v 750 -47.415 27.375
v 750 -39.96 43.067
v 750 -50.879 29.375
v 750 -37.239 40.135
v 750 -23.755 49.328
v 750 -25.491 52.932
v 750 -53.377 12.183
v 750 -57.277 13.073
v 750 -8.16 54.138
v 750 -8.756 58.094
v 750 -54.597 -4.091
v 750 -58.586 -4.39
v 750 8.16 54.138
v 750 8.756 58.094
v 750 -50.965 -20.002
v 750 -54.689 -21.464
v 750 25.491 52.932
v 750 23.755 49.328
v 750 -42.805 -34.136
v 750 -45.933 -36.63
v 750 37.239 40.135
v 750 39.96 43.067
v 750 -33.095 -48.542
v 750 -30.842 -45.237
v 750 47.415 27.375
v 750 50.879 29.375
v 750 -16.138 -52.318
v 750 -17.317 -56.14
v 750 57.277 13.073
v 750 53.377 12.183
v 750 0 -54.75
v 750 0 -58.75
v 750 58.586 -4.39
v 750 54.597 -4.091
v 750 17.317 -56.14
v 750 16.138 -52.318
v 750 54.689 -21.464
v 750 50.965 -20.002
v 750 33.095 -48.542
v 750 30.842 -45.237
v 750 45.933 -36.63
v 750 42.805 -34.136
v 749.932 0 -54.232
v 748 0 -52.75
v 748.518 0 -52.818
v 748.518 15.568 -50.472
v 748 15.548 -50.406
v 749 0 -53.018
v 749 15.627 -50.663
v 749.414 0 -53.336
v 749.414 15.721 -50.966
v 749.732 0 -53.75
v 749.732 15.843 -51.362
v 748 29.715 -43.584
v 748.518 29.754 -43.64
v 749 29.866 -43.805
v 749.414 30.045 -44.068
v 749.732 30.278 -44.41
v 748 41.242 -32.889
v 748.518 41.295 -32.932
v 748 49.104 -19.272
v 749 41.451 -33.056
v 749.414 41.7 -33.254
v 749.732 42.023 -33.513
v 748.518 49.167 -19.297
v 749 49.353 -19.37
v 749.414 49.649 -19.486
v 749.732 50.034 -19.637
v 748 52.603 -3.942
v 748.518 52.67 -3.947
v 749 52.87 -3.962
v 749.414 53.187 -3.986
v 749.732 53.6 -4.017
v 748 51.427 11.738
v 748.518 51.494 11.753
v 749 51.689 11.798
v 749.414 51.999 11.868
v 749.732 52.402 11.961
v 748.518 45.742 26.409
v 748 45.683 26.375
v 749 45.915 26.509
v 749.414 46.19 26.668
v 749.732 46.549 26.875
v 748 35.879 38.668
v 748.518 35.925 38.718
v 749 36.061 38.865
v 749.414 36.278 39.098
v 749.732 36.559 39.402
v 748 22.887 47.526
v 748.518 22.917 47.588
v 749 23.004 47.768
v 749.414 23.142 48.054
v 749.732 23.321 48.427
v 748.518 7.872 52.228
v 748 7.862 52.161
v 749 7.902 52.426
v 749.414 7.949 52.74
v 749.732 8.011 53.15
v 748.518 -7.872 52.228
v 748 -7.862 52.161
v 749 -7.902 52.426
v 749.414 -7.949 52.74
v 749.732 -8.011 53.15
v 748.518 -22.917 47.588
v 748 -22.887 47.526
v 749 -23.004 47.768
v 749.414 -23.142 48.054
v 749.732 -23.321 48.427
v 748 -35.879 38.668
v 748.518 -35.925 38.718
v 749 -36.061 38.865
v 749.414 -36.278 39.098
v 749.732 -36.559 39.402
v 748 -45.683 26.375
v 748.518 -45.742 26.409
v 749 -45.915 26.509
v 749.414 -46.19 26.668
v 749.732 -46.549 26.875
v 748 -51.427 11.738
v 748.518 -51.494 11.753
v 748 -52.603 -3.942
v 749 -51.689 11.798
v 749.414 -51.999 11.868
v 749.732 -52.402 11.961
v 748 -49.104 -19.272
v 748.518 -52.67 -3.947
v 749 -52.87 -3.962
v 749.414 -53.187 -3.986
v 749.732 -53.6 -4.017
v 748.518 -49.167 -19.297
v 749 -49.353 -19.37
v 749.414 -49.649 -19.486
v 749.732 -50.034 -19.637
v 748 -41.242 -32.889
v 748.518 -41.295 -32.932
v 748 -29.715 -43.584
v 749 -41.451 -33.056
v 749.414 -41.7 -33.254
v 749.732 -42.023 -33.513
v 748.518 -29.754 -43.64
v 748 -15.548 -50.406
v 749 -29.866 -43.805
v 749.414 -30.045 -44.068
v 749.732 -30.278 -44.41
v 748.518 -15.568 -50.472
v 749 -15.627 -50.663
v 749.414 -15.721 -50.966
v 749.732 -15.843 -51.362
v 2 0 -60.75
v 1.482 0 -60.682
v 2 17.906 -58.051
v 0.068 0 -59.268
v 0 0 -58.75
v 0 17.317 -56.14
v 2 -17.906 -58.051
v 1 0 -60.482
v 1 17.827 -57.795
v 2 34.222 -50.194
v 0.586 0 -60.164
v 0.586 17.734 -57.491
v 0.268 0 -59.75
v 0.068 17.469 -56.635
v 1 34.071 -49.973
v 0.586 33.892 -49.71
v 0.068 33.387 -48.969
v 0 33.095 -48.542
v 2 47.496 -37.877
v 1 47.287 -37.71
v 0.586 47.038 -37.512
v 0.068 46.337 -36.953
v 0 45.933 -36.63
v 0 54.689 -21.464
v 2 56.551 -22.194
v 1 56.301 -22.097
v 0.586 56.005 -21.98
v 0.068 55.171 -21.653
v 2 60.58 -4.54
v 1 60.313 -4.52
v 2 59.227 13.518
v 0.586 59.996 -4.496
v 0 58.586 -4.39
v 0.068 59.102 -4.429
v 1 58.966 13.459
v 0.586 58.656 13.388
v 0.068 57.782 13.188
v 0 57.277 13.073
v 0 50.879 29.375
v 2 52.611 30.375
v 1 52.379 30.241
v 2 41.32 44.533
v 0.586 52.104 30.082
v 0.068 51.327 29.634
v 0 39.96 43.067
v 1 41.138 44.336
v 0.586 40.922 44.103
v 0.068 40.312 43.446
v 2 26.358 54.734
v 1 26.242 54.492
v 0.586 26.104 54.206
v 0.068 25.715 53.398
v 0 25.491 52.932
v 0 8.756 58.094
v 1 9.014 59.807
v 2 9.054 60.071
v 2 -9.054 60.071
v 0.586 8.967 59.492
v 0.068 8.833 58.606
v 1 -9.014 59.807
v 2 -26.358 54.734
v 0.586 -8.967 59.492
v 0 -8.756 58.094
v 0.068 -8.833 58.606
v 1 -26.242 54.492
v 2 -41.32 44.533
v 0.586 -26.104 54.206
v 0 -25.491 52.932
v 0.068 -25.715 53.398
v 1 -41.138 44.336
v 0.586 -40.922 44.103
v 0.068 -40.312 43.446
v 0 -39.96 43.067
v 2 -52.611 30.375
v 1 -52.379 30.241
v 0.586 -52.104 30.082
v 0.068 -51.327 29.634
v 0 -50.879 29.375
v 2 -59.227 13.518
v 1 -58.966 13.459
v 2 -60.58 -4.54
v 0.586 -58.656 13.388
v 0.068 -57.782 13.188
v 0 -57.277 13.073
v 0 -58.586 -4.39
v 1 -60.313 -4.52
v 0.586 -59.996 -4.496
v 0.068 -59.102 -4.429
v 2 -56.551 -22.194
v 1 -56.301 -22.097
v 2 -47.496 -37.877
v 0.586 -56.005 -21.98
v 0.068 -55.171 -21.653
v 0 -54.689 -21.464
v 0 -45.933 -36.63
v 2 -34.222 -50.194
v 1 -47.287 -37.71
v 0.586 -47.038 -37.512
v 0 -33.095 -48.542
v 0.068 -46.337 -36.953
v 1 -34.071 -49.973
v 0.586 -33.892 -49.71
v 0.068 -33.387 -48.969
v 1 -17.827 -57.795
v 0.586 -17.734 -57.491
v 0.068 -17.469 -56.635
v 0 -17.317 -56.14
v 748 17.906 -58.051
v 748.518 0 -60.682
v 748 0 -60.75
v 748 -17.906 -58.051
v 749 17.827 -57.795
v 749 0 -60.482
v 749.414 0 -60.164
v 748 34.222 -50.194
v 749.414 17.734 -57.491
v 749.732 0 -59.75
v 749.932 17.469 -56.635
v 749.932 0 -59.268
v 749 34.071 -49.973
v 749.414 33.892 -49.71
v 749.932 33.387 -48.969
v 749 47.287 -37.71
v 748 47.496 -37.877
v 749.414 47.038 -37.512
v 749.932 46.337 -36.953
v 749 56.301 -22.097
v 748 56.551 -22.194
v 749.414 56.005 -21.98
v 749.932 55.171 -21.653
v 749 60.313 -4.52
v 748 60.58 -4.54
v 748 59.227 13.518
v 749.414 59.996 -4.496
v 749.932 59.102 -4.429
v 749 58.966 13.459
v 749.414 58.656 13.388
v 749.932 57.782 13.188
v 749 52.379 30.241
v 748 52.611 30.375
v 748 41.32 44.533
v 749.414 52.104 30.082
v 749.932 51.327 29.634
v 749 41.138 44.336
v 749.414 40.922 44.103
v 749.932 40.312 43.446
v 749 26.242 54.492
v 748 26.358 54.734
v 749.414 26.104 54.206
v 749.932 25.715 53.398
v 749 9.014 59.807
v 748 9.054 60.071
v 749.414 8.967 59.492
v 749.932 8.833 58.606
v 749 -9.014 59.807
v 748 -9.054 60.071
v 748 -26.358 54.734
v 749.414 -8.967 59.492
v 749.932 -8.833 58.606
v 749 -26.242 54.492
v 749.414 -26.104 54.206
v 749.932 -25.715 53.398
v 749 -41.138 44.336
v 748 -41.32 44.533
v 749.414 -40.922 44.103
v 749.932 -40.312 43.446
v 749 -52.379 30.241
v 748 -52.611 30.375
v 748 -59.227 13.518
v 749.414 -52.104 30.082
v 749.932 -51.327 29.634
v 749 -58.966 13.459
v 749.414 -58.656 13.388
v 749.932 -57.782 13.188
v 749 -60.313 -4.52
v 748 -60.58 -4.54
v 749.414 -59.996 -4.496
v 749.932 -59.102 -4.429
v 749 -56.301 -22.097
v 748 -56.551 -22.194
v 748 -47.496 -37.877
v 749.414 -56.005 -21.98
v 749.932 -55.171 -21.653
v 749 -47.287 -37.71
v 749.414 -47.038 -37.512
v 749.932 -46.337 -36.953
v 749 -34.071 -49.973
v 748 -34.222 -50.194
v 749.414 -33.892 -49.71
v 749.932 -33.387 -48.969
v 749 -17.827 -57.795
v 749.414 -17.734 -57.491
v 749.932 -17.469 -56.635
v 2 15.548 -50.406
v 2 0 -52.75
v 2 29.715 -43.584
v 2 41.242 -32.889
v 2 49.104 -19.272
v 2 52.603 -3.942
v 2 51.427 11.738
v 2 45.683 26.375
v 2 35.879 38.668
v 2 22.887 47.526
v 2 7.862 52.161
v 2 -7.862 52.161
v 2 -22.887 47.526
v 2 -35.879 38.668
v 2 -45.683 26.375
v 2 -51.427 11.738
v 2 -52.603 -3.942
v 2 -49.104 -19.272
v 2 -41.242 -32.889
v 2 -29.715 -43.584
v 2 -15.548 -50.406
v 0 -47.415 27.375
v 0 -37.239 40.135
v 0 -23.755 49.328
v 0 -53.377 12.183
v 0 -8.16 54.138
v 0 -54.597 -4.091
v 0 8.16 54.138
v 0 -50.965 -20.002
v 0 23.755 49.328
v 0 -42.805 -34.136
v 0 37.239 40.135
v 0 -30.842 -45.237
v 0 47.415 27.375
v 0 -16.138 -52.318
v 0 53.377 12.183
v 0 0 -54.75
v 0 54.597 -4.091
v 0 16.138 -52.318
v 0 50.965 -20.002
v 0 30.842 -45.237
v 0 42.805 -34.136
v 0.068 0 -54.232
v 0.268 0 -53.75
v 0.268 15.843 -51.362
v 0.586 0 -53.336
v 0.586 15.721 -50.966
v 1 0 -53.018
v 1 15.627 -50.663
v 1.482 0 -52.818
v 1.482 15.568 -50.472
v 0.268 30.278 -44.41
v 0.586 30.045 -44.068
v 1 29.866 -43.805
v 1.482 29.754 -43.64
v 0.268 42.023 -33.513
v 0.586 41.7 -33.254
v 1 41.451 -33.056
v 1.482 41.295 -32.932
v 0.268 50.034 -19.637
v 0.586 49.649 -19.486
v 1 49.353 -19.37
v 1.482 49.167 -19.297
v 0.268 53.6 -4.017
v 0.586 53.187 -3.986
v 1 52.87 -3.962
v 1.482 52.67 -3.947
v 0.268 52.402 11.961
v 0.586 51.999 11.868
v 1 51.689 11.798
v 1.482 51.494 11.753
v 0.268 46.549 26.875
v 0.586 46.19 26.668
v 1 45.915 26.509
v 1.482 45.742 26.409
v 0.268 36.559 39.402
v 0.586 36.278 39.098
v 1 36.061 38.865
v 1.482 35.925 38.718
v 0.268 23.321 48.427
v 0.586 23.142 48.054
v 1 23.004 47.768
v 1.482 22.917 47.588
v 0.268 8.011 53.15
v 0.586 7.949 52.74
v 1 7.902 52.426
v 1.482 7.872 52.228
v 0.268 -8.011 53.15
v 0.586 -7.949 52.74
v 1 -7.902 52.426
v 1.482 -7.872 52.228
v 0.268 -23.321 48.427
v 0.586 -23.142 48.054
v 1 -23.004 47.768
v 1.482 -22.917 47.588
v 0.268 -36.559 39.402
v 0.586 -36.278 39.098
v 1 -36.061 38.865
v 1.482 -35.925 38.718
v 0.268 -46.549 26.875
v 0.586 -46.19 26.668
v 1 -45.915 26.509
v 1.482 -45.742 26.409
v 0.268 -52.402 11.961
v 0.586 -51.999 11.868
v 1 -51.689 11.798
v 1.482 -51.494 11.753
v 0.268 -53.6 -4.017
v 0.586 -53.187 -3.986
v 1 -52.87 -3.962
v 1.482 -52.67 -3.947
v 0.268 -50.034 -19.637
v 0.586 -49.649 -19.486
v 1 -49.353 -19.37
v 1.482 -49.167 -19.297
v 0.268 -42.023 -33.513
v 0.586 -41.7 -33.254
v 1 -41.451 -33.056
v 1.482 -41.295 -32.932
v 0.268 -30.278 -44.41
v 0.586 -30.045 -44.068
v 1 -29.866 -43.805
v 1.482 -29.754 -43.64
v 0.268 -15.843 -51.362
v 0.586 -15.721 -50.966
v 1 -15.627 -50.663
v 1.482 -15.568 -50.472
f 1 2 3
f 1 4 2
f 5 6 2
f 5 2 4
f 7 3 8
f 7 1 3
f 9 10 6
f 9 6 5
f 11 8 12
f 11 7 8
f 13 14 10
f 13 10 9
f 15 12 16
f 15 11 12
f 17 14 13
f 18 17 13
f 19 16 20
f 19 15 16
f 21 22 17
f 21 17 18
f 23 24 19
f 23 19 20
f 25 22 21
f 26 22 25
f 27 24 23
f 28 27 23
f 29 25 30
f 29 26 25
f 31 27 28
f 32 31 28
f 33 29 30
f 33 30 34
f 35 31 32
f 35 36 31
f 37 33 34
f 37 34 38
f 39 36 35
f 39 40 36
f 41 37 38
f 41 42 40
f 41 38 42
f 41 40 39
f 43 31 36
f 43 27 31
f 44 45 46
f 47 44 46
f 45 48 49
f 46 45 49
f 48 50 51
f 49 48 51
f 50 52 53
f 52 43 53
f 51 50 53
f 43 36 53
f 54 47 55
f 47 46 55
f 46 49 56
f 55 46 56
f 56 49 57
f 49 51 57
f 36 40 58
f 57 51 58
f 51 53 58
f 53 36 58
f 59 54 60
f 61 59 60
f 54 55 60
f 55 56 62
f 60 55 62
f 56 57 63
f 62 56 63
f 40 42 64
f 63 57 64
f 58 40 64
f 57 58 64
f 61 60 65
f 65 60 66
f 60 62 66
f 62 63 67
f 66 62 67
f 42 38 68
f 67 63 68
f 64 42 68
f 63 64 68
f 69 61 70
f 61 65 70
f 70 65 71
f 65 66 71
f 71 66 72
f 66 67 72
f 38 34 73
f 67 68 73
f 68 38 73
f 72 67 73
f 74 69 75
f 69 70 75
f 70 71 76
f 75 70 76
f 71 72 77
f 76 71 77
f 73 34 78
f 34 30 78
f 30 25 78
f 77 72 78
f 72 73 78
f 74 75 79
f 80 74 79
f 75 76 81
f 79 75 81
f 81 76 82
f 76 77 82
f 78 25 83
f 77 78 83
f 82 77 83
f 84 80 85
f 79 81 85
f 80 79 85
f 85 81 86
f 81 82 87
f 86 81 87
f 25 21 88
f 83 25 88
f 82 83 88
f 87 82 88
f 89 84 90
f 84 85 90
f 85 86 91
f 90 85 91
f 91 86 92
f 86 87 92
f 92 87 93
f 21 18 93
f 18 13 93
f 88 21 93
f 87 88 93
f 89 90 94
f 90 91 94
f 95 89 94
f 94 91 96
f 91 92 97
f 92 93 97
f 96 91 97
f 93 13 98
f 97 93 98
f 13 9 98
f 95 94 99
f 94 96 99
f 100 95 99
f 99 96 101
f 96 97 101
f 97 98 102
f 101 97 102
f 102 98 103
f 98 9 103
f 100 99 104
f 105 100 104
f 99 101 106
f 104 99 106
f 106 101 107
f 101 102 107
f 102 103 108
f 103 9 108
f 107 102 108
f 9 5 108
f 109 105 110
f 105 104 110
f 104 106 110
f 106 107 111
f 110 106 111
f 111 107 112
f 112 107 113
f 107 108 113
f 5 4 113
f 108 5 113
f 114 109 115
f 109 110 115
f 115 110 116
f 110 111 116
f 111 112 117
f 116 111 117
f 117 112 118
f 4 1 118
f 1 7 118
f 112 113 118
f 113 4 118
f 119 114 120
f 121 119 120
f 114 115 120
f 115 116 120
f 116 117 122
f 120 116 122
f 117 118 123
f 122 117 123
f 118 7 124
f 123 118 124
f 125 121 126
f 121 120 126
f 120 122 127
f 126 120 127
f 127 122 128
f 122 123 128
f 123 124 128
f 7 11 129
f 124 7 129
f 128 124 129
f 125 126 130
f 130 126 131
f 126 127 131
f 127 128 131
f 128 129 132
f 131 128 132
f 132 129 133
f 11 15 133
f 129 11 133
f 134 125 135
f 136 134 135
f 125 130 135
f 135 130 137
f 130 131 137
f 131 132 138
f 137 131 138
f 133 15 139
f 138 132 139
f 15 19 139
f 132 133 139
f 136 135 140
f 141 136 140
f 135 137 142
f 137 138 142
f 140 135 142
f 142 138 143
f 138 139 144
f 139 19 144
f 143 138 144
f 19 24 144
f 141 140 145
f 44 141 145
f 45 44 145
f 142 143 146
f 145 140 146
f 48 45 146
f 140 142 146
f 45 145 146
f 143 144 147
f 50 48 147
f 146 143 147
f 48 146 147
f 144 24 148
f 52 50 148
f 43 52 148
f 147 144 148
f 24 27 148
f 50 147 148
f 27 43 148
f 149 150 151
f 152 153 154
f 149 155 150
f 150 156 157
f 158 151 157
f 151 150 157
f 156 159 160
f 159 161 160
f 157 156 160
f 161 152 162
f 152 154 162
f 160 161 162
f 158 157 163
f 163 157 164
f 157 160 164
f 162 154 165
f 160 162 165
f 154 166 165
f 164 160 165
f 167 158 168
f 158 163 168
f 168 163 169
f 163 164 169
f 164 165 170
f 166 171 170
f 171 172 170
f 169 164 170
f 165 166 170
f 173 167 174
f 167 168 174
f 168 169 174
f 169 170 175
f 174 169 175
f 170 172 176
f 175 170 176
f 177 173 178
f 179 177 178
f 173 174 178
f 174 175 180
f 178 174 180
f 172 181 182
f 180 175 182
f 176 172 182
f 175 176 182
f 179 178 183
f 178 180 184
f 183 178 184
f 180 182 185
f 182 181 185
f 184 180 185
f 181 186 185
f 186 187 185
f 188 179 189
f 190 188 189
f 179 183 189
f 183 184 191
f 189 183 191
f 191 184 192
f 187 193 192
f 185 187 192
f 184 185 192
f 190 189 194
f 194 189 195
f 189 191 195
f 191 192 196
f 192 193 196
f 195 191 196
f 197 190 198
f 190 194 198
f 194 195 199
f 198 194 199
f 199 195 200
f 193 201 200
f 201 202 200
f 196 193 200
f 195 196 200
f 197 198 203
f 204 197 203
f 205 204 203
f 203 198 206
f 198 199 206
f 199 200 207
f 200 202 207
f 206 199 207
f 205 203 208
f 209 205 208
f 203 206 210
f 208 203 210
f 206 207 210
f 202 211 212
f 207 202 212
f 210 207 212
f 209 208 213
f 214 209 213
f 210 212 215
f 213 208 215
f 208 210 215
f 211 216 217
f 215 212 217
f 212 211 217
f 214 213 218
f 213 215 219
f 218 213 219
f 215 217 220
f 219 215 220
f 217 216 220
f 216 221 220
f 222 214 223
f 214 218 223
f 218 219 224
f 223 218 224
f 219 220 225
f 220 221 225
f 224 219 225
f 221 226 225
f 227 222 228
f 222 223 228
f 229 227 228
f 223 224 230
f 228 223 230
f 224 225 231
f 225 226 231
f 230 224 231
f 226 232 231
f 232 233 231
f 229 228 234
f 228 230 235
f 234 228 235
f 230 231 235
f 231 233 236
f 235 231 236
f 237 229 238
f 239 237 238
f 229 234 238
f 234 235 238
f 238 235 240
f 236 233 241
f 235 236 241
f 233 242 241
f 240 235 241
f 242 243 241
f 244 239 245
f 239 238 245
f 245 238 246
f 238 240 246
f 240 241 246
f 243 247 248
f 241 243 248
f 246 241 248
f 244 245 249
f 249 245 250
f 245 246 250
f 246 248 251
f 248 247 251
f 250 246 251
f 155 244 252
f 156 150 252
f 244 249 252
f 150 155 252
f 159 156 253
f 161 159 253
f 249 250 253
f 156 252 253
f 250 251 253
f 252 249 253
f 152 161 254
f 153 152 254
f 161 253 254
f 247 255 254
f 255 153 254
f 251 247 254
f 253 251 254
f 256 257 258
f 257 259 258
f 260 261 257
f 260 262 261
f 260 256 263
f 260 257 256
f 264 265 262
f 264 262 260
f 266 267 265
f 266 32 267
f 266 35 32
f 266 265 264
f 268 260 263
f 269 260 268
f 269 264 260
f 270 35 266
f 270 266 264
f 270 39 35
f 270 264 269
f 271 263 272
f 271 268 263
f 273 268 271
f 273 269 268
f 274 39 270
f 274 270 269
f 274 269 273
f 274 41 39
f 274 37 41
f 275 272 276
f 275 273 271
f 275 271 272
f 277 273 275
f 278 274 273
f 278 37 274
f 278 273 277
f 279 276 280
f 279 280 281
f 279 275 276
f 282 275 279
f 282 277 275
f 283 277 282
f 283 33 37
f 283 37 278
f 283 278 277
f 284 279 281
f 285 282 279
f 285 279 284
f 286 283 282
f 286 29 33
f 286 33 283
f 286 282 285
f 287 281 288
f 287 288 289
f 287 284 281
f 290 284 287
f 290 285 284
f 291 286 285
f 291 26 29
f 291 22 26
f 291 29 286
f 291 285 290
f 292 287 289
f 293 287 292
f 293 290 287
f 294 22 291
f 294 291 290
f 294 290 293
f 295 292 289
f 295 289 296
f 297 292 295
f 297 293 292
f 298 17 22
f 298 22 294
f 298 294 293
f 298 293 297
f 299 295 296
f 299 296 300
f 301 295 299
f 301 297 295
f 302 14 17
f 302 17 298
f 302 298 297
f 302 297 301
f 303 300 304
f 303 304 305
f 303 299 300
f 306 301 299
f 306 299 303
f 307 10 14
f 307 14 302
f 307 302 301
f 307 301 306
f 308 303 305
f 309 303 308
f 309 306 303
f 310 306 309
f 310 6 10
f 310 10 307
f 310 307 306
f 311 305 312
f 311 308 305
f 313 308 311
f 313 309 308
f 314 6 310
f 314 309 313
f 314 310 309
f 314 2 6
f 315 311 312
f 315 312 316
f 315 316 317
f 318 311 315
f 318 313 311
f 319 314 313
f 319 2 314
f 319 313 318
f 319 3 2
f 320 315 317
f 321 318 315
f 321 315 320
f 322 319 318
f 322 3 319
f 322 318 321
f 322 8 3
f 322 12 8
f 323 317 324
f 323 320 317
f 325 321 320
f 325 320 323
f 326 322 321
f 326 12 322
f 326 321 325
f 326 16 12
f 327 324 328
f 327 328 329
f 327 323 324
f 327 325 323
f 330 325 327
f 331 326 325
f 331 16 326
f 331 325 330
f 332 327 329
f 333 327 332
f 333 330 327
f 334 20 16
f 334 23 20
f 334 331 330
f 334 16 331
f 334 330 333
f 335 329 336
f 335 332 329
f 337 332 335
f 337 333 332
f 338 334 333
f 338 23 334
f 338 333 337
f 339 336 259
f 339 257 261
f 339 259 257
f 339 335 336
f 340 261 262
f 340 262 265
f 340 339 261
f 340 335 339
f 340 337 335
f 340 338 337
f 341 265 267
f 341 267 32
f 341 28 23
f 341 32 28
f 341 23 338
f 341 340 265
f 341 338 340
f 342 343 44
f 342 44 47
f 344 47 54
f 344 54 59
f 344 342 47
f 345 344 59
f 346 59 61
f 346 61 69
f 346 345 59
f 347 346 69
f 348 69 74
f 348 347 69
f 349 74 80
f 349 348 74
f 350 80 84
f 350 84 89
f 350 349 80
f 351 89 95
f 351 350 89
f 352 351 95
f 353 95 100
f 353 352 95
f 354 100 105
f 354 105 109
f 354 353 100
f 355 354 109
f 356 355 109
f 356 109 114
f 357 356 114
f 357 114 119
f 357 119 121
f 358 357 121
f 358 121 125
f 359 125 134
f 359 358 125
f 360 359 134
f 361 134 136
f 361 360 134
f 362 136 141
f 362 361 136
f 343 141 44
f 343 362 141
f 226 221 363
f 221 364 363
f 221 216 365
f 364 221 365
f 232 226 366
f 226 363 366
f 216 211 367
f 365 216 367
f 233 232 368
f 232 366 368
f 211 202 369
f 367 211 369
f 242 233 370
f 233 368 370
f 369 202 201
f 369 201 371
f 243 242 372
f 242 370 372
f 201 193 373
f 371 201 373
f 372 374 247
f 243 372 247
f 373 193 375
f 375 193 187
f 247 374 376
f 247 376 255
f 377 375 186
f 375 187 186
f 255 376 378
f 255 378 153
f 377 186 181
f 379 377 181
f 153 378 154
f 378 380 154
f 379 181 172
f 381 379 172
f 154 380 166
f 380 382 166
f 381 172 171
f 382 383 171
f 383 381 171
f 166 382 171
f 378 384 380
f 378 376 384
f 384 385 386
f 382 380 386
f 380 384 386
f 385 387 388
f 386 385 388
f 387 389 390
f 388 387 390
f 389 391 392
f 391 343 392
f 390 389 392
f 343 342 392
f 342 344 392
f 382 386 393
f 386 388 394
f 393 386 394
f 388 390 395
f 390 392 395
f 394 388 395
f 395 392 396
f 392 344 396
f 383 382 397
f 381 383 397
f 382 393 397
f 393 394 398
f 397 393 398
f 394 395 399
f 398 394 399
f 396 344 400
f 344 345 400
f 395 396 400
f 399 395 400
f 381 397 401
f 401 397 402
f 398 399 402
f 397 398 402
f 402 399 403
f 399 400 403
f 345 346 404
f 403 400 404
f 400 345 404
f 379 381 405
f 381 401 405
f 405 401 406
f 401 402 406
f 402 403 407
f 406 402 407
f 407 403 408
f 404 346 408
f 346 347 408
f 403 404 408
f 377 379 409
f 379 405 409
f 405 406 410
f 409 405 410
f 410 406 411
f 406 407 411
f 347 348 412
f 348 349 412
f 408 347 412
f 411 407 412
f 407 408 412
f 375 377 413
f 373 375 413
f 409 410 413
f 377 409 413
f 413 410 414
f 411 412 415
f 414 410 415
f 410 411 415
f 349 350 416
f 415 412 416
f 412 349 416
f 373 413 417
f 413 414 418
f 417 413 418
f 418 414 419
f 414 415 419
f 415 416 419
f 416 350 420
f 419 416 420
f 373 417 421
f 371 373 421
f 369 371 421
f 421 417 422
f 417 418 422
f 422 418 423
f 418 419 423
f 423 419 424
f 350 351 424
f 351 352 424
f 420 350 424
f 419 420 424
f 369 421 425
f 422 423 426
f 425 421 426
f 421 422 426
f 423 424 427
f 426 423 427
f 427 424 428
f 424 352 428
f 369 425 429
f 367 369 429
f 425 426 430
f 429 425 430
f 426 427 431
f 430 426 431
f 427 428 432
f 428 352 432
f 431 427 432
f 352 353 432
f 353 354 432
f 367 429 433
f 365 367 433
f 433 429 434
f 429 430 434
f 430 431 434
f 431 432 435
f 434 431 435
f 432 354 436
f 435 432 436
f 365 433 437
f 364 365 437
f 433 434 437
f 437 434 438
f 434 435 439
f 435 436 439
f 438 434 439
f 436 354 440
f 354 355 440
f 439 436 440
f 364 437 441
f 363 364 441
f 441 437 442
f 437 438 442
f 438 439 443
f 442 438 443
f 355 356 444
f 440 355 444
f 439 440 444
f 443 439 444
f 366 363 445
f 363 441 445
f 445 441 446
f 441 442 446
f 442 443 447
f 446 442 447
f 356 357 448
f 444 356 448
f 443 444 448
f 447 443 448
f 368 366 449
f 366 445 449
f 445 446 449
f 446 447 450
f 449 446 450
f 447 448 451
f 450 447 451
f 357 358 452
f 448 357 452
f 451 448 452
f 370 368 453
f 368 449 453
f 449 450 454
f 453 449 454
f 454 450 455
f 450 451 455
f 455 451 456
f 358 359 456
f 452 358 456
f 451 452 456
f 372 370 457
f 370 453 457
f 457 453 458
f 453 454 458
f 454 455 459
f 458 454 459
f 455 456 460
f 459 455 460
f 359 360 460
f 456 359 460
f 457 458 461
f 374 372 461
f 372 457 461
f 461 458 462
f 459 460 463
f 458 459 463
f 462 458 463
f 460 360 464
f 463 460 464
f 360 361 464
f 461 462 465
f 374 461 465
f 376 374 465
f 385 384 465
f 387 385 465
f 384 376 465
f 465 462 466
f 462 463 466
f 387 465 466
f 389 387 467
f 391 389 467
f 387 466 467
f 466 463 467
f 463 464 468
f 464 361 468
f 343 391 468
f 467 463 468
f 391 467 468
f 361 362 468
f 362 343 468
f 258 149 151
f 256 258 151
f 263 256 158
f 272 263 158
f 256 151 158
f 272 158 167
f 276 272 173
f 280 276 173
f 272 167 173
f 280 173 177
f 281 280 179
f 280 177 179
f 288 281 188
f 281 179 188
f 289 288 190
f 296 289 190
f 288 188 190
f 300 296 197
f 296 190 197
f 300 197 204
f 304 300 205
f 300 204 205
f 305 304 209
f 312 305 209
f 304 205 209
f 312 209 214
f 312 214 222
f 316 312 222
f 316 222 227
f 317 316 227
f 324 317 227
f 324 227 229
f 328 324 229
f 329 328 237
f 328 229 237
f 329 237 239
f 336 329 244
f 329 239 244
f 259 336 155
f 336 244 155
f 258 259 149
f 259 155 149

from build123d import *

# Parameters (mm, degrees)
SKETCH1_R           = 60.75
SKETCH1_R_2         = 52.75
BOSS_EXTRUDE1_DEPTH = 750
FILLET1_R           = 2
FILLET2_R           = 2


with BuildPart() as part:
    # Sketch1 → Boss-Extrude1 (new body)
    with BuildSketch(Plane(origin=(0, 0, 0), x_dir=(0, 0, -1), z_dir=(1, 0, 0))):
        Circle(SKETCH1_R)
        Circle(SKETCH1_R_2, mode=Mode.SUBTRACT)
    extrude(amount=BOSS_EXTRUDE1_DEPTH)

    # Fillet1
    fillet1_edges = [part.edges().sort_by_distance(p)[0] for p in [
        (750, 0, 60.75),
        (750, 0, 52.75),
    ]]
    fillet(fillet1_edges, radius=FILLET1_R)

    # Fillet2
    fillet2_edges = [part.edges().sort_by_distance(p)[0] for p in [
        (0, 0, 60.75),
        (0, 0, 52.75),
    ]]
    fillet(fillet2_edges, radius=FILLET2_R)


solid = part.part
